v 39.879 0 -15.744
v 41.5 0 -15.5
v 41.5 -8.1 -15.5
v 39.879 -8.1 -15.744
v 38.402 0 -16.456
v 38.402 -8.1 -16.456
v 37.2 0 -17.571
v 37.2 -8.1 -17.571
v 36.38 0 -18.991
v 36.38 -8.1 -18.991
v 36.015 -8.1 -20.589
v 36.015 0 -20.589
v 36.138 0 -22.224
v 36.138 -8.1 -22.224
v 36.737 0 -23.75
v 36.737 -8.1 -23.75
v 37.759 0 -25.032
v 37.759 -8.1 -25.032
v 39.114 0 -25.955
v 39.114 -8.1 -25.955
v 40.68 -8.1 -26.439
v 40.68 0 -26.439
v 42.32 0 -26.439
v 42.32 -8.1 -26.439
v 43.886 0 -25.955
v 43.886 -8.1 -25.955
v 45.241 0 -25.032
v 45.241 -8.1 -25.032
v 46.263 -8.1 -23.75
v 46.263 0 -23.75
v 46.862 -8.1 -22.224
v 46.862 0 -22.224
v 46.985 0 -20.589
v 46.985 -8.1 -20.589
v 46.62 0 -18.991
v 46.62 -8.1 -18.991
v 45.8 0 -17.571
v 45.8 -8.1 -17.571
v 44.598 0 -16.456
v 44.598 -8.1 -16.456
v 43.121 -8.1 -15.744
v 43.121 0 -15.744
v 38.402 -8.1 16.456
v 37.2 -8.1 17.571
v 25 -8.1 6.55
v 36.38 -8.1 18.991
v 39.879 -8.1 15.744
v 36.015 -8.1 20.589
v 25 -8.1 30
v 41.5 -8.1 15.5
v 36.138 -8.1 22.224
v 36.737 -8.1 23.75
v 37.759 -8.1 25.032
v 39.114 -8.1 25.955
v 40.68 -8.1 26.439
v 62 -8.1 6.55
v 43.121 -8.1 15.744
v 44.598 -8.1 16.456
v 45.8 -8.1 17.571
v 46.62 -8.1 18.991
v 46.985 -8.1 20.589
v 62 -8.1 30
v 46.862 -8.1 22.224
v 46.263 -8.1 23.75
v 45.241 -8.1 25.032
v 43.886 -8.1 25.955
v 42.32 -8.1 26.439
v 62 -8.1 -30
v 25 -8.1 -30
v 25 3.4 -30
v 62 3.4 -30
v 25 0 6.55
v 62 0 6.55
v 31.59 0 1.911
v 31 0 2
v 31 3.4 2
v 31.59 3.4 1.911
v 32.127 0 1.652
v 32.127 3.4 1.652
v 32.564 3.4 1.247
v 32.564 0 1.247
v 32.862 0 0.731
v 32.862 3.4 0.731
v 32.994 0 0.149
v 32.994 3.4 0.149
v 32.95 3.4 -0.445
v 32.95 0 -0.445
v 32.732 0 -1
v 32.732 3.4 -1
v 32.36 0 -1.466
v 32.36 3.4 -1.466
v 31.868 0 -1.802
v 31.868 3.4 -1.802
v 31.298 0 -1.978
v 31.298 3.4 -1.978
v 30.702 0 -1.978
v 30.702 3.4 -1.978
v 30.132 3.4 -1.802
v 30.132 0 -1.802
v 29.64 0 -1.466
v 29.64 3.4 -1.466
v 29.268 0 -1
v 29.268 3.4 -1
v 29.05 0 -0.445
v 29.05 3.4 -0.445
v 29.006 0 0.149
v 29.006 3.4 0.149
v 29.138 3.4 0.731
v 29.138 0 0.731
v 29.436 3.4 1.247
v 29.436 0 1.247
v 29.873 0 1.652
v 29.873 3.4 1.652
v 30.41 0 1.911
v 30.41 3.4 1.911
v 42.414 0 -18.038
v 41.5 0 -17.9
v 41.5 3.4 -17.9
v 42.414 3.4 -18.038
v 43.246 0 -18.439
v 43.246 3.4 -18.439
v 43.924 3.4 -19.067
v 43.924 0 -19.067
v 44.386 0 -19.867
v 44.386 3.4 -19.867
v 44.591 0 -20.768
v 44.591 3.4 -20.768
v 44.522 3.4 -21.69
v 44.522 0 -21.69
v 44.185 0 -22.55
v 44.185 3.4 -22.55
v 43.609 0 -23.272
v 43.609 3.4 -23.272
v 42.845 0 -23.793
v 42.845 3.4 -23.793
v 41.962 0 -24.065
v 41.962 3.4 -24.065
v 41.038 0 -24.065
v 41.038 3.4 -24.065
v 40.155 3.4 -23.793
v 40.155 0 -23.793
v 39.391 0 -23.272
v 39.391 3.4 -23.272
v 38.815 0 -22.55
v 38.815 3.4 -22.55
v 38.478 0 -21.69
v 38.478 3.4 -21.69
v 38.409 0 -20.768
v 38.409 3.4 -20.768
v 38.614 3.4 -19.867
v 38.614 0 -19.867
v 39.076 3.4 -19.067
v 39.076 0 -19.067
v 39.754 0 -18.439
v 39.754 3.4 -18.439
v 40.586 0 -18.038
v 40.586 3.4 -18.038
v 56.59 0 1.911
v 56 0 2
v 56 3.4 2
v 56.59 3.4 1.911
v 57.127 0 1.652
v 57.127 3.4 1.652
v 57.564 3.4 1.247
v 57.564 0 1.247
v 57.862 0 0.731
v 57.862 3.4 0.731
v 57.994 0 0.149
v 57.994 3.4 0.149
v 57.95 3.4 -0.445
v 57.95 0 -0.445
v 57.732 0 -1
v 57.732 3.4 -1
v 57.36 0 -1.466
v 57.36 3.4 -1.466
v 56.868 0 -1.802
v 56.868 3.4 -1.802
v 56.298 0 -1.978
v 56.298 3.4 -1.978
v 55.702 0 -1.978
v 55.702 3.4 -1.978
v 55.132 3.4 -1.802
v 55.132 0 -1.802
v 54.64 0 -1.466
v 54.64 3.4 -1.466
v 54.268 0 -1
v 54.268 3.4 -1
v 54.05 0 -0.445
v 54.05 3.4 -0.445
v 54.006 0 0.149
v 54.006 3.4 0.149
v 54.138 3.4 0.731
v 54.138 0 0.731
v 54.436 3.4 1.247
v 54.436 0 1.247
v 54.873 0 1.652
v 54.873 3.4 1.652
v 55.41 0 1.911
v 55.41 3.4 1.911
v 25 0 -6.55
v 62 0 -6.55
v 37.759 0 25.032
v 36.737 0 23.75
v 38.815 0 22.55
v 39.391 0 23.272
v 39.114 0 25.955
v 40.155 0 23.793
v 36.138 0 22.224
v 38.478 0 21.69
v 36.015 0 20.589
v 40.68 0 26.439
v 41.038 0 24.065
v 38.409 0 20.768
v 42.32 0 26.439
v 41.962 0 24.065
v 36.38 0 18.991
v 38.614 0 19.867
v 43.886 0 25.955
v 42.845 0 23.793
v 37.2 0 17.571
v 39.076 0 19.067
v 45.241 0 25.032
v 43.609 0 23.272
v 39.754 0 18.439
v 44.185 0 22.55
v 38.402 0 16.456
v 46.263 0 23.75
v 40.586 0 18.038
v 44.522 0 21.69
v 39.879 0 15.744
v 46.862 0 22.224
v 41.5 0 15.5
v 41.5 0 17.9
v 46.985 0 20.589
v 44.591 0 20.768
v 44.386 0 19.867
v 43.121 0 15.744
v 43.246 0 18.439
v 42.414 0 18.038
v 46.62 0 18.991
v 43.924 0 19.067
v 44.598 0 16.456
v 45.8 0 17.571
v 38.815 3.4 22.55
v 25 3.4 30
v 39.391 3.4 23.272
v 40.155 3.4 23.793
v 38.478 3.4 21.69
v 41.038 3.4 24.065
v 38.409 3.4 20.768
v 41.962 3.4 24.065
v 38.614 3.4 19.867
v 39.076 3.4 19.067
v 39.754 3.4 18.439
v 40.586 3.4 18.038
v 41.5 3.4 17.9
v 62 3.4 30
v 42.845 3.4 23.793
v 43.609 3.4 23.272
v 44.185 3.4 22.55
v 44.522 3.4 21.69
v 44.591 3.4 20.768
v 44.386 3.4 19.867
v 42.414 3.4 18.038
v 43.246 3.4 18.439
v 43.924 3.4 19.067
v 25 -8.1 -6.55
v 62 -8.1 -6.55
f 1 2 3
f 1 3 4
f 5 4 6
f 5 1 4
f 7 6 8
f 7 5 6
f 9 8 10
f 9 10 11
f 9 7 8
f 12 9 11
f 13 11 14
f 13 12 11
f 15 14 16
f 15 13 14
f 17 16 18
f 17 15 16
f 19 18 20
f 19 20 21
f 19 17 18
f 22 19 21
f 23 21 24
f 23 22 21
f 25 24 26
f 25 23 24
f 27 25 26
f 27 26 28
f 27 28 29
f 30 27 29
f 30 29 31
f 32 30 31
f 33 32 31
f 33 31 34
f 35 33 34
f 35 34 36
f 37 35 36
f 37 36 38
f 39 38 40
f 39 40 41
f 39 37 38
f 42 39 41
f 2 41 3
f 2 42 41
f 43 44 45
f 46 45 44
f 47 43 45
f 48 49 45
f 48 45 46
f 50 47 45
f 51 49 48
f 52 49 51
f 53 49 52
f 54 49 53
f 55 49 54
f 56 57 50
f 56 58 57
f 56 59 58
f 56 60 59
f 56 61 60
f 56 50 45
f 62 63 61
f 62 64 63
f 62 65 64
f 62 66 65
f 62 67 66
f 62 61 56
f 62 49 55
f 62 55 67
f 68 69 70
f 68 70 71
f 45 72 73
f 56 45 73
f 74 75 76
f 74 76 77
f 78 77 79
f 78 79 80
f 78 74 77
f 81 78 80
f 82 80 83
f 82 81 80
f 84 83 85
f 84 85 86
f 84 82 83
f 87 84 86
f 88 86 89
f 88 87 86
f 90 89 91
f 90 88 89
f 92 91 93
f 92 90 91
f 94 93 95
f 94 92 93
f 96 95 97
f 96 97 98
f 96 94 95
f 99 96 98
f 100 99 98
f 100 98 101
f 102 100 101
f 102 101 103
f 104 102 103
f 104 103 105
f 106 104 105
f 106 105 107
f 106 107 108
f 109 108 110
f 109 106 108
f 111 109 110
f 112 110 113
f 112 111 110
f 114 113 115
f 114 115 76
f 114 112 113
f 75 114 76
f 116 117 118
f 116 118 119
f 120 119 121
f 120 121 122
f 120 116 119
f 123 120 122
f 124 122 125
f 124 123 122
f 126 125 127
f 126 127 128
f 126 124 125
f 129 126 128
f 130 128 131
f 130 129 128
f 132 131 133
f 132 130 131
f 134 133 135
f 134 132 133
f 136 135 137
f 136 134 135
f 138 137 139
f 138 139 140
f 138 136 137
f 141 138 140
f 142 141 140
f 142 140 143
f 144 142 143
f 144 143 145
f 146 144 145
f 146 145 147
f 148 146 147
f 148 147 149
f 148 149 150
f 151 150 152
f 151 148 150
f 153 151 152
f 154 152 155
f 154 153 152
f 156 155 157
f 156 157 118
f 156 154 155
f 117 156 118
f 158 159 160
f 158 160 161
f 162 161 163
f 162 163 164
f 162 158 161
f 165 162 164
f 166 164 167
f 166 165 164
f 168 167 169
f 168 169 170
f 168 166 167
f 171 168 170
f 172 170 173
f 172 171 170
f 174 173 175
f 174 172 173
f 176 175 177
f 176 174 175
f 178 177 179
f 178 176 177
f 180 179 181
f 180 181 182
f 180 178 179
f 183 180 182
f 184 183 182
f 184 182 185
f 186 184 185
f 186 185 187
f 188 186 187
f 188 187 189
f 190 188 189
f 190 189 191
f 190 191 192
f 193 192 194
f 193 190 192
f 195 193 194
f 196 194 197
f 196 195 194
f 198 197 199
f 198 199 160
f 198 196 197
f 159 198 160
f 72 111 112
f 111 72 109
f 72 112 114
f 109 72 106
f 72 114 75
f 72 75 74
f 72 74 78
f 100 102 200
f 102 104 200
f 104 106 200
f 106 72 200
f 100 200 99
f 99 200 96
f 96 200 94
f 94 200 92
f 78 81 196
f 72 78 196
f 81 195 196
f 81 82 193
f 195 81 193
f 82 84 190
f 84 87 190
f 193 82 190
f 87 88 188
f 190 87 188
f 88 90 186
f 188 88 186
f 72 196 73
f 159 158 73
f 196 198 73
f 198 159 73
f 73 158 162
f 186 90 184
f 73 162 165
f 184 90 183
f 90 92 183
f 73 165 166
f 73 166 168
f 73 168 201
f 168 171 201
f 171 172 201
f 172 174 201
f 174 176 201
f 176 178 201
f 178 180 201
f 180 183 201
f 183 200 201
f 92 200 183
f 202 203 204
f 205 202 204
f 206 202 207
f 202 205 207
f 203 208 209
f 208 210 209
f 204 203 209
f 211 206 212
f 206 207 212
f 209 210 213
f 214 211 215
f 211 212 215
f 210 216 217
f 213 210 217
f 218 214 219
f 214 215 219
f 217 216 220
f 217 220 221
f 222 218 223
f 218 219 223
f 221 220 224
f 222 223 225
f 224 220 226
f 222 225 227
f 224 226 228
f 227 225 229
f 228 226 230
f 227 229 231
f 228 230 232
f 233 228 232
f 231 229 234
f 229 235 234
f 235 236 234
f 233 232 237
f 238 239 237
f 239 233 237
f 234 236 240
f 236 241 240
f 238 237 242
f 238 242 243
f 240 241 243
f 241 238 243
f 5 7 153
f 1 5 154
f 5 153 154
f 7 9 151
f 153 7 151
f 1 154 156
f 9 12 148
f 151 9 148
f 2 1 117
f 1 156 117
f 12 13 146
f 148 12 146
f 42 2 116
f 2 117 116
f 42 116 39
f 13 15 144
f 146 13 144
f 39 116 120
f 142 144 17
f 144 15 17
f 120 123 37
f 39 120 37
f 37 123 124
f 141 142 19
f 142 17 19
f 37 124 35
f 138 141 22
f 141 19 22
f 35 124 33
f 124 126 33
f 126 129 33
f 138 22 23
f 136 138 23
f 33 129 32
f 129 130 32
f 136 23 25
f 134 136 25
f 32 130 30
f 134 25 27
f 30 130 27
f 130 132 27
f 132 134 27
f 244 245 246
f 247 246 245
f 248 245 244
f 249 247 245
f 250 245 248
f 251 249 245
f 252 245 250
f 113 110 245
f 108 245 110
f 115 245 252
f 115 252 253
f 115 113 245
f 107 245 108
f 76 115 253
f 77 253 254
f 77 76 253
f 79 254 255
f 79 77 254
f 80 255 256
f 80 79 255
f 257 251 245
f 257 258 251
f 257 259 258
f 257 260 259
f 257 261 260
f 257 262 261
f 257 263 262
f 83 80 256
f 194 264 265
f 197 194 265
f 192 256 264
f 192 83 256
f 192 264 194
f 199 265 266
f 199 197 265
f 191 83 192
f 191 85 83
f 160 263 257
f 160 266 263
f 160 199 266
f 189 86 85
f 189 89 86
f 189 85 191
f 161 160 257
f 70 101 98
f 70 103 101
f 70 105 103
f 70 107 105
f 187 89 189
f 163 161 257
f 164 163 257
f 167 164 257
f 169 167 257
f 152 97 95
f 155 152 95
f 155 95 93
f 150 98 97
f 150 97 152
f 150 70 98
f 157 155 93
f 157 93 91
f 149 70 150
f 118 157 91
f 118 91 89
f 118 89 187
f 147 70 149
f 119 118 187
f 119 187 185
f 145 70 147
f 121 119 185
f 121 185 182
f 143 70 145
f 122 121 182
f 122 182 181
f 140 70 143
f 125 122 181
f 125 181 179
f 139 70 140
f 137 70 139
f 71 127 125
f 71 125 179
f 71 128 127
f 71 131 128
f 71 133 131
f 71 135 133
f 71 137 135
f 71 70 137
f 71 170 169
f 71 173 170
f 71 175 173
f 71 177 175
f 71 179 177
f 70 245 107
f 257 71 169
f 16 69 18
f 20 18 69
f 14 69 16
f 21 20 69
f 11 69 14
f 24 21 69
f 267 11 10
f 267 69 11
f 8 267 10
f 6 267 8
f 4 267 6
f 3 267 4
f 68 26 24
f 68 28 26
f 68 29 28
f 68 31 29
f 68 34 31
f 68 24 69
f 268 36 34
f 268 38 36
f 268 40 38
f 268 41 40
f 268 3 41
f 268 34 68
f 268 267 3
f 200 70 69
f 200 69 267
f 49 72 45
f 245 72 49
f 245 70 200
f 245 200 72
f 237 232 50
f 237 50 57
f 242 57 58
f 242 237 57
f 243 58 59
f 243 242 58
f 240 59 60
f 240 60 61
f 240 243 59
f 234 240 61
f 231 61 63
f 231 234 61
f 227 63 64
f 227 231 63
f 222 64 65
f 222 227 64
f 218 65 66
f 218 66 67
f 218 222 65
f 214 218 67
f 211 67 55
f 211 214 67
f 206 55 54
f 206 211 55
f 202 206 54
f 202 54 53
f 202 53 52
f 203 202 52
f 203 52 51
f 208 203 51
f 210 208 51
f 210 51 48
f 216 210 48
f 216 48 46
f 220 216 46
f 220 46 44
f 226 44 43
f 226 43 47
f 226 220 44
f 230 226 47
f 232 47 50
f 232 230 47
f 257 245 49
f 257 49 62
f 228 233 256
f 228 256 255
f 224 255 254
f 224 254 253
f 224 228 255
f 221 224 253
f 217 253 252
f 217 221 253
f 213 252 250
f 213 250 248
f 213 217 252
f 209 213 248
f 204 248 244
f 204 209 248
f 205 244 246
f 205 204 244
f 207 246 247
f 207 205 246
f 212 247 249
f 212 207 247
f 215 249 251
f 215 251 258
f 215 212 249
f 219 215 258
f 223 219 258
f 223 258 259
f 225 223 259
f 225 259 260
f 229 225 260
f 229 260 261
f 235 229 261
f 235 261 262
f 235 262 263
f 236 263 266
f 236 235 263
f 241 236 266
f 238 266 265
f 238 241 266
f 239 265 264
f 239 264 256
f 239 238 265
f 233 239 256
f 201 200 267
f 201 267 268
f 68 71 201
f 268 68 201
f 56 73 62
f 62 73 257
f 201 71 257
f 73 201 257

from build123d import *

# Parameters (mm, degrees)
SKETCH7_W            = 37
SKETCH7_H            = 60
SKETCH7_R            = 3.1
SKETCH7_R_2          = 2
BOSS_EXTRUDE10_DEPTH = 3.4
SKETCH8_W            = 37
SKETCH8_H            = 23.45
SKETCH8_R            = 5.5
BOSS_EXTRUDE12_DEPTH = 8.1


with BuildPart() as part:
    # Sketch7 → Boss-Extrude10 (new body)
    with BuildSketch(Plane(origin=(0, 0, 0), x_dir=(1, 0, 0), z_dir=(0, 1, 0))):
        with Locations((43.5, 0)):
            Rectangle(SKETCH7_W, SKETCH7_H)
        with Locations(Location((41.5, 21, 0), (0, 0, 270))):
            Circle(SKETCH7_R, mode=Mode.SUBTRACT)
        with Locations(Location((41.5, -21, 0), (0, 0, 90))):
            Circle(SKETCH7_R, mode=Mode.SUBTRACT)
        with Locations(Location((56, 0, 0), (0, 0, 270))):
            Circle(SKETCH7_R_2, mode=Mode.SUBTRACT)
        with Locations(Location((31, 0, 0), (0, 0, 270))):
            Circle(SKETCH7_R_2, mode=Mode.SUBTRACT)
    extrude(amount=BOSS_EXTRUDE10_DEPTH)

    # Sketch8 → Boss-Extrude12 (add)
    # profile 1 of 2: a face of its own
    with BuildSketch(Plane.XZ):
        with Locations((43.5, 18.275)):
            Rectangle(SKETCH8_W, SKETCH8_H)
        with Locations(Location((41.5, 21, 0), (0, 0, 270))):
            Circle(SKETCH8_R, mode=Mode.SUBTRACT)
    # profile 2 of 2: a face of its own
    with BuildSketch(Plane.XZ):
        with Locations((43.5, -18.275)):
            Rectangle(SKETCH8_W, SKETCH8_H)
        with Locations(Location((41.5, -21, 0), (0, 0, 90))):
            Circle(SKETCH8_R, mode=Mode.SUBTRACT)
    extrude(amount=BOSS_EXTRUDE12_DEPTH)


solid = part.part
